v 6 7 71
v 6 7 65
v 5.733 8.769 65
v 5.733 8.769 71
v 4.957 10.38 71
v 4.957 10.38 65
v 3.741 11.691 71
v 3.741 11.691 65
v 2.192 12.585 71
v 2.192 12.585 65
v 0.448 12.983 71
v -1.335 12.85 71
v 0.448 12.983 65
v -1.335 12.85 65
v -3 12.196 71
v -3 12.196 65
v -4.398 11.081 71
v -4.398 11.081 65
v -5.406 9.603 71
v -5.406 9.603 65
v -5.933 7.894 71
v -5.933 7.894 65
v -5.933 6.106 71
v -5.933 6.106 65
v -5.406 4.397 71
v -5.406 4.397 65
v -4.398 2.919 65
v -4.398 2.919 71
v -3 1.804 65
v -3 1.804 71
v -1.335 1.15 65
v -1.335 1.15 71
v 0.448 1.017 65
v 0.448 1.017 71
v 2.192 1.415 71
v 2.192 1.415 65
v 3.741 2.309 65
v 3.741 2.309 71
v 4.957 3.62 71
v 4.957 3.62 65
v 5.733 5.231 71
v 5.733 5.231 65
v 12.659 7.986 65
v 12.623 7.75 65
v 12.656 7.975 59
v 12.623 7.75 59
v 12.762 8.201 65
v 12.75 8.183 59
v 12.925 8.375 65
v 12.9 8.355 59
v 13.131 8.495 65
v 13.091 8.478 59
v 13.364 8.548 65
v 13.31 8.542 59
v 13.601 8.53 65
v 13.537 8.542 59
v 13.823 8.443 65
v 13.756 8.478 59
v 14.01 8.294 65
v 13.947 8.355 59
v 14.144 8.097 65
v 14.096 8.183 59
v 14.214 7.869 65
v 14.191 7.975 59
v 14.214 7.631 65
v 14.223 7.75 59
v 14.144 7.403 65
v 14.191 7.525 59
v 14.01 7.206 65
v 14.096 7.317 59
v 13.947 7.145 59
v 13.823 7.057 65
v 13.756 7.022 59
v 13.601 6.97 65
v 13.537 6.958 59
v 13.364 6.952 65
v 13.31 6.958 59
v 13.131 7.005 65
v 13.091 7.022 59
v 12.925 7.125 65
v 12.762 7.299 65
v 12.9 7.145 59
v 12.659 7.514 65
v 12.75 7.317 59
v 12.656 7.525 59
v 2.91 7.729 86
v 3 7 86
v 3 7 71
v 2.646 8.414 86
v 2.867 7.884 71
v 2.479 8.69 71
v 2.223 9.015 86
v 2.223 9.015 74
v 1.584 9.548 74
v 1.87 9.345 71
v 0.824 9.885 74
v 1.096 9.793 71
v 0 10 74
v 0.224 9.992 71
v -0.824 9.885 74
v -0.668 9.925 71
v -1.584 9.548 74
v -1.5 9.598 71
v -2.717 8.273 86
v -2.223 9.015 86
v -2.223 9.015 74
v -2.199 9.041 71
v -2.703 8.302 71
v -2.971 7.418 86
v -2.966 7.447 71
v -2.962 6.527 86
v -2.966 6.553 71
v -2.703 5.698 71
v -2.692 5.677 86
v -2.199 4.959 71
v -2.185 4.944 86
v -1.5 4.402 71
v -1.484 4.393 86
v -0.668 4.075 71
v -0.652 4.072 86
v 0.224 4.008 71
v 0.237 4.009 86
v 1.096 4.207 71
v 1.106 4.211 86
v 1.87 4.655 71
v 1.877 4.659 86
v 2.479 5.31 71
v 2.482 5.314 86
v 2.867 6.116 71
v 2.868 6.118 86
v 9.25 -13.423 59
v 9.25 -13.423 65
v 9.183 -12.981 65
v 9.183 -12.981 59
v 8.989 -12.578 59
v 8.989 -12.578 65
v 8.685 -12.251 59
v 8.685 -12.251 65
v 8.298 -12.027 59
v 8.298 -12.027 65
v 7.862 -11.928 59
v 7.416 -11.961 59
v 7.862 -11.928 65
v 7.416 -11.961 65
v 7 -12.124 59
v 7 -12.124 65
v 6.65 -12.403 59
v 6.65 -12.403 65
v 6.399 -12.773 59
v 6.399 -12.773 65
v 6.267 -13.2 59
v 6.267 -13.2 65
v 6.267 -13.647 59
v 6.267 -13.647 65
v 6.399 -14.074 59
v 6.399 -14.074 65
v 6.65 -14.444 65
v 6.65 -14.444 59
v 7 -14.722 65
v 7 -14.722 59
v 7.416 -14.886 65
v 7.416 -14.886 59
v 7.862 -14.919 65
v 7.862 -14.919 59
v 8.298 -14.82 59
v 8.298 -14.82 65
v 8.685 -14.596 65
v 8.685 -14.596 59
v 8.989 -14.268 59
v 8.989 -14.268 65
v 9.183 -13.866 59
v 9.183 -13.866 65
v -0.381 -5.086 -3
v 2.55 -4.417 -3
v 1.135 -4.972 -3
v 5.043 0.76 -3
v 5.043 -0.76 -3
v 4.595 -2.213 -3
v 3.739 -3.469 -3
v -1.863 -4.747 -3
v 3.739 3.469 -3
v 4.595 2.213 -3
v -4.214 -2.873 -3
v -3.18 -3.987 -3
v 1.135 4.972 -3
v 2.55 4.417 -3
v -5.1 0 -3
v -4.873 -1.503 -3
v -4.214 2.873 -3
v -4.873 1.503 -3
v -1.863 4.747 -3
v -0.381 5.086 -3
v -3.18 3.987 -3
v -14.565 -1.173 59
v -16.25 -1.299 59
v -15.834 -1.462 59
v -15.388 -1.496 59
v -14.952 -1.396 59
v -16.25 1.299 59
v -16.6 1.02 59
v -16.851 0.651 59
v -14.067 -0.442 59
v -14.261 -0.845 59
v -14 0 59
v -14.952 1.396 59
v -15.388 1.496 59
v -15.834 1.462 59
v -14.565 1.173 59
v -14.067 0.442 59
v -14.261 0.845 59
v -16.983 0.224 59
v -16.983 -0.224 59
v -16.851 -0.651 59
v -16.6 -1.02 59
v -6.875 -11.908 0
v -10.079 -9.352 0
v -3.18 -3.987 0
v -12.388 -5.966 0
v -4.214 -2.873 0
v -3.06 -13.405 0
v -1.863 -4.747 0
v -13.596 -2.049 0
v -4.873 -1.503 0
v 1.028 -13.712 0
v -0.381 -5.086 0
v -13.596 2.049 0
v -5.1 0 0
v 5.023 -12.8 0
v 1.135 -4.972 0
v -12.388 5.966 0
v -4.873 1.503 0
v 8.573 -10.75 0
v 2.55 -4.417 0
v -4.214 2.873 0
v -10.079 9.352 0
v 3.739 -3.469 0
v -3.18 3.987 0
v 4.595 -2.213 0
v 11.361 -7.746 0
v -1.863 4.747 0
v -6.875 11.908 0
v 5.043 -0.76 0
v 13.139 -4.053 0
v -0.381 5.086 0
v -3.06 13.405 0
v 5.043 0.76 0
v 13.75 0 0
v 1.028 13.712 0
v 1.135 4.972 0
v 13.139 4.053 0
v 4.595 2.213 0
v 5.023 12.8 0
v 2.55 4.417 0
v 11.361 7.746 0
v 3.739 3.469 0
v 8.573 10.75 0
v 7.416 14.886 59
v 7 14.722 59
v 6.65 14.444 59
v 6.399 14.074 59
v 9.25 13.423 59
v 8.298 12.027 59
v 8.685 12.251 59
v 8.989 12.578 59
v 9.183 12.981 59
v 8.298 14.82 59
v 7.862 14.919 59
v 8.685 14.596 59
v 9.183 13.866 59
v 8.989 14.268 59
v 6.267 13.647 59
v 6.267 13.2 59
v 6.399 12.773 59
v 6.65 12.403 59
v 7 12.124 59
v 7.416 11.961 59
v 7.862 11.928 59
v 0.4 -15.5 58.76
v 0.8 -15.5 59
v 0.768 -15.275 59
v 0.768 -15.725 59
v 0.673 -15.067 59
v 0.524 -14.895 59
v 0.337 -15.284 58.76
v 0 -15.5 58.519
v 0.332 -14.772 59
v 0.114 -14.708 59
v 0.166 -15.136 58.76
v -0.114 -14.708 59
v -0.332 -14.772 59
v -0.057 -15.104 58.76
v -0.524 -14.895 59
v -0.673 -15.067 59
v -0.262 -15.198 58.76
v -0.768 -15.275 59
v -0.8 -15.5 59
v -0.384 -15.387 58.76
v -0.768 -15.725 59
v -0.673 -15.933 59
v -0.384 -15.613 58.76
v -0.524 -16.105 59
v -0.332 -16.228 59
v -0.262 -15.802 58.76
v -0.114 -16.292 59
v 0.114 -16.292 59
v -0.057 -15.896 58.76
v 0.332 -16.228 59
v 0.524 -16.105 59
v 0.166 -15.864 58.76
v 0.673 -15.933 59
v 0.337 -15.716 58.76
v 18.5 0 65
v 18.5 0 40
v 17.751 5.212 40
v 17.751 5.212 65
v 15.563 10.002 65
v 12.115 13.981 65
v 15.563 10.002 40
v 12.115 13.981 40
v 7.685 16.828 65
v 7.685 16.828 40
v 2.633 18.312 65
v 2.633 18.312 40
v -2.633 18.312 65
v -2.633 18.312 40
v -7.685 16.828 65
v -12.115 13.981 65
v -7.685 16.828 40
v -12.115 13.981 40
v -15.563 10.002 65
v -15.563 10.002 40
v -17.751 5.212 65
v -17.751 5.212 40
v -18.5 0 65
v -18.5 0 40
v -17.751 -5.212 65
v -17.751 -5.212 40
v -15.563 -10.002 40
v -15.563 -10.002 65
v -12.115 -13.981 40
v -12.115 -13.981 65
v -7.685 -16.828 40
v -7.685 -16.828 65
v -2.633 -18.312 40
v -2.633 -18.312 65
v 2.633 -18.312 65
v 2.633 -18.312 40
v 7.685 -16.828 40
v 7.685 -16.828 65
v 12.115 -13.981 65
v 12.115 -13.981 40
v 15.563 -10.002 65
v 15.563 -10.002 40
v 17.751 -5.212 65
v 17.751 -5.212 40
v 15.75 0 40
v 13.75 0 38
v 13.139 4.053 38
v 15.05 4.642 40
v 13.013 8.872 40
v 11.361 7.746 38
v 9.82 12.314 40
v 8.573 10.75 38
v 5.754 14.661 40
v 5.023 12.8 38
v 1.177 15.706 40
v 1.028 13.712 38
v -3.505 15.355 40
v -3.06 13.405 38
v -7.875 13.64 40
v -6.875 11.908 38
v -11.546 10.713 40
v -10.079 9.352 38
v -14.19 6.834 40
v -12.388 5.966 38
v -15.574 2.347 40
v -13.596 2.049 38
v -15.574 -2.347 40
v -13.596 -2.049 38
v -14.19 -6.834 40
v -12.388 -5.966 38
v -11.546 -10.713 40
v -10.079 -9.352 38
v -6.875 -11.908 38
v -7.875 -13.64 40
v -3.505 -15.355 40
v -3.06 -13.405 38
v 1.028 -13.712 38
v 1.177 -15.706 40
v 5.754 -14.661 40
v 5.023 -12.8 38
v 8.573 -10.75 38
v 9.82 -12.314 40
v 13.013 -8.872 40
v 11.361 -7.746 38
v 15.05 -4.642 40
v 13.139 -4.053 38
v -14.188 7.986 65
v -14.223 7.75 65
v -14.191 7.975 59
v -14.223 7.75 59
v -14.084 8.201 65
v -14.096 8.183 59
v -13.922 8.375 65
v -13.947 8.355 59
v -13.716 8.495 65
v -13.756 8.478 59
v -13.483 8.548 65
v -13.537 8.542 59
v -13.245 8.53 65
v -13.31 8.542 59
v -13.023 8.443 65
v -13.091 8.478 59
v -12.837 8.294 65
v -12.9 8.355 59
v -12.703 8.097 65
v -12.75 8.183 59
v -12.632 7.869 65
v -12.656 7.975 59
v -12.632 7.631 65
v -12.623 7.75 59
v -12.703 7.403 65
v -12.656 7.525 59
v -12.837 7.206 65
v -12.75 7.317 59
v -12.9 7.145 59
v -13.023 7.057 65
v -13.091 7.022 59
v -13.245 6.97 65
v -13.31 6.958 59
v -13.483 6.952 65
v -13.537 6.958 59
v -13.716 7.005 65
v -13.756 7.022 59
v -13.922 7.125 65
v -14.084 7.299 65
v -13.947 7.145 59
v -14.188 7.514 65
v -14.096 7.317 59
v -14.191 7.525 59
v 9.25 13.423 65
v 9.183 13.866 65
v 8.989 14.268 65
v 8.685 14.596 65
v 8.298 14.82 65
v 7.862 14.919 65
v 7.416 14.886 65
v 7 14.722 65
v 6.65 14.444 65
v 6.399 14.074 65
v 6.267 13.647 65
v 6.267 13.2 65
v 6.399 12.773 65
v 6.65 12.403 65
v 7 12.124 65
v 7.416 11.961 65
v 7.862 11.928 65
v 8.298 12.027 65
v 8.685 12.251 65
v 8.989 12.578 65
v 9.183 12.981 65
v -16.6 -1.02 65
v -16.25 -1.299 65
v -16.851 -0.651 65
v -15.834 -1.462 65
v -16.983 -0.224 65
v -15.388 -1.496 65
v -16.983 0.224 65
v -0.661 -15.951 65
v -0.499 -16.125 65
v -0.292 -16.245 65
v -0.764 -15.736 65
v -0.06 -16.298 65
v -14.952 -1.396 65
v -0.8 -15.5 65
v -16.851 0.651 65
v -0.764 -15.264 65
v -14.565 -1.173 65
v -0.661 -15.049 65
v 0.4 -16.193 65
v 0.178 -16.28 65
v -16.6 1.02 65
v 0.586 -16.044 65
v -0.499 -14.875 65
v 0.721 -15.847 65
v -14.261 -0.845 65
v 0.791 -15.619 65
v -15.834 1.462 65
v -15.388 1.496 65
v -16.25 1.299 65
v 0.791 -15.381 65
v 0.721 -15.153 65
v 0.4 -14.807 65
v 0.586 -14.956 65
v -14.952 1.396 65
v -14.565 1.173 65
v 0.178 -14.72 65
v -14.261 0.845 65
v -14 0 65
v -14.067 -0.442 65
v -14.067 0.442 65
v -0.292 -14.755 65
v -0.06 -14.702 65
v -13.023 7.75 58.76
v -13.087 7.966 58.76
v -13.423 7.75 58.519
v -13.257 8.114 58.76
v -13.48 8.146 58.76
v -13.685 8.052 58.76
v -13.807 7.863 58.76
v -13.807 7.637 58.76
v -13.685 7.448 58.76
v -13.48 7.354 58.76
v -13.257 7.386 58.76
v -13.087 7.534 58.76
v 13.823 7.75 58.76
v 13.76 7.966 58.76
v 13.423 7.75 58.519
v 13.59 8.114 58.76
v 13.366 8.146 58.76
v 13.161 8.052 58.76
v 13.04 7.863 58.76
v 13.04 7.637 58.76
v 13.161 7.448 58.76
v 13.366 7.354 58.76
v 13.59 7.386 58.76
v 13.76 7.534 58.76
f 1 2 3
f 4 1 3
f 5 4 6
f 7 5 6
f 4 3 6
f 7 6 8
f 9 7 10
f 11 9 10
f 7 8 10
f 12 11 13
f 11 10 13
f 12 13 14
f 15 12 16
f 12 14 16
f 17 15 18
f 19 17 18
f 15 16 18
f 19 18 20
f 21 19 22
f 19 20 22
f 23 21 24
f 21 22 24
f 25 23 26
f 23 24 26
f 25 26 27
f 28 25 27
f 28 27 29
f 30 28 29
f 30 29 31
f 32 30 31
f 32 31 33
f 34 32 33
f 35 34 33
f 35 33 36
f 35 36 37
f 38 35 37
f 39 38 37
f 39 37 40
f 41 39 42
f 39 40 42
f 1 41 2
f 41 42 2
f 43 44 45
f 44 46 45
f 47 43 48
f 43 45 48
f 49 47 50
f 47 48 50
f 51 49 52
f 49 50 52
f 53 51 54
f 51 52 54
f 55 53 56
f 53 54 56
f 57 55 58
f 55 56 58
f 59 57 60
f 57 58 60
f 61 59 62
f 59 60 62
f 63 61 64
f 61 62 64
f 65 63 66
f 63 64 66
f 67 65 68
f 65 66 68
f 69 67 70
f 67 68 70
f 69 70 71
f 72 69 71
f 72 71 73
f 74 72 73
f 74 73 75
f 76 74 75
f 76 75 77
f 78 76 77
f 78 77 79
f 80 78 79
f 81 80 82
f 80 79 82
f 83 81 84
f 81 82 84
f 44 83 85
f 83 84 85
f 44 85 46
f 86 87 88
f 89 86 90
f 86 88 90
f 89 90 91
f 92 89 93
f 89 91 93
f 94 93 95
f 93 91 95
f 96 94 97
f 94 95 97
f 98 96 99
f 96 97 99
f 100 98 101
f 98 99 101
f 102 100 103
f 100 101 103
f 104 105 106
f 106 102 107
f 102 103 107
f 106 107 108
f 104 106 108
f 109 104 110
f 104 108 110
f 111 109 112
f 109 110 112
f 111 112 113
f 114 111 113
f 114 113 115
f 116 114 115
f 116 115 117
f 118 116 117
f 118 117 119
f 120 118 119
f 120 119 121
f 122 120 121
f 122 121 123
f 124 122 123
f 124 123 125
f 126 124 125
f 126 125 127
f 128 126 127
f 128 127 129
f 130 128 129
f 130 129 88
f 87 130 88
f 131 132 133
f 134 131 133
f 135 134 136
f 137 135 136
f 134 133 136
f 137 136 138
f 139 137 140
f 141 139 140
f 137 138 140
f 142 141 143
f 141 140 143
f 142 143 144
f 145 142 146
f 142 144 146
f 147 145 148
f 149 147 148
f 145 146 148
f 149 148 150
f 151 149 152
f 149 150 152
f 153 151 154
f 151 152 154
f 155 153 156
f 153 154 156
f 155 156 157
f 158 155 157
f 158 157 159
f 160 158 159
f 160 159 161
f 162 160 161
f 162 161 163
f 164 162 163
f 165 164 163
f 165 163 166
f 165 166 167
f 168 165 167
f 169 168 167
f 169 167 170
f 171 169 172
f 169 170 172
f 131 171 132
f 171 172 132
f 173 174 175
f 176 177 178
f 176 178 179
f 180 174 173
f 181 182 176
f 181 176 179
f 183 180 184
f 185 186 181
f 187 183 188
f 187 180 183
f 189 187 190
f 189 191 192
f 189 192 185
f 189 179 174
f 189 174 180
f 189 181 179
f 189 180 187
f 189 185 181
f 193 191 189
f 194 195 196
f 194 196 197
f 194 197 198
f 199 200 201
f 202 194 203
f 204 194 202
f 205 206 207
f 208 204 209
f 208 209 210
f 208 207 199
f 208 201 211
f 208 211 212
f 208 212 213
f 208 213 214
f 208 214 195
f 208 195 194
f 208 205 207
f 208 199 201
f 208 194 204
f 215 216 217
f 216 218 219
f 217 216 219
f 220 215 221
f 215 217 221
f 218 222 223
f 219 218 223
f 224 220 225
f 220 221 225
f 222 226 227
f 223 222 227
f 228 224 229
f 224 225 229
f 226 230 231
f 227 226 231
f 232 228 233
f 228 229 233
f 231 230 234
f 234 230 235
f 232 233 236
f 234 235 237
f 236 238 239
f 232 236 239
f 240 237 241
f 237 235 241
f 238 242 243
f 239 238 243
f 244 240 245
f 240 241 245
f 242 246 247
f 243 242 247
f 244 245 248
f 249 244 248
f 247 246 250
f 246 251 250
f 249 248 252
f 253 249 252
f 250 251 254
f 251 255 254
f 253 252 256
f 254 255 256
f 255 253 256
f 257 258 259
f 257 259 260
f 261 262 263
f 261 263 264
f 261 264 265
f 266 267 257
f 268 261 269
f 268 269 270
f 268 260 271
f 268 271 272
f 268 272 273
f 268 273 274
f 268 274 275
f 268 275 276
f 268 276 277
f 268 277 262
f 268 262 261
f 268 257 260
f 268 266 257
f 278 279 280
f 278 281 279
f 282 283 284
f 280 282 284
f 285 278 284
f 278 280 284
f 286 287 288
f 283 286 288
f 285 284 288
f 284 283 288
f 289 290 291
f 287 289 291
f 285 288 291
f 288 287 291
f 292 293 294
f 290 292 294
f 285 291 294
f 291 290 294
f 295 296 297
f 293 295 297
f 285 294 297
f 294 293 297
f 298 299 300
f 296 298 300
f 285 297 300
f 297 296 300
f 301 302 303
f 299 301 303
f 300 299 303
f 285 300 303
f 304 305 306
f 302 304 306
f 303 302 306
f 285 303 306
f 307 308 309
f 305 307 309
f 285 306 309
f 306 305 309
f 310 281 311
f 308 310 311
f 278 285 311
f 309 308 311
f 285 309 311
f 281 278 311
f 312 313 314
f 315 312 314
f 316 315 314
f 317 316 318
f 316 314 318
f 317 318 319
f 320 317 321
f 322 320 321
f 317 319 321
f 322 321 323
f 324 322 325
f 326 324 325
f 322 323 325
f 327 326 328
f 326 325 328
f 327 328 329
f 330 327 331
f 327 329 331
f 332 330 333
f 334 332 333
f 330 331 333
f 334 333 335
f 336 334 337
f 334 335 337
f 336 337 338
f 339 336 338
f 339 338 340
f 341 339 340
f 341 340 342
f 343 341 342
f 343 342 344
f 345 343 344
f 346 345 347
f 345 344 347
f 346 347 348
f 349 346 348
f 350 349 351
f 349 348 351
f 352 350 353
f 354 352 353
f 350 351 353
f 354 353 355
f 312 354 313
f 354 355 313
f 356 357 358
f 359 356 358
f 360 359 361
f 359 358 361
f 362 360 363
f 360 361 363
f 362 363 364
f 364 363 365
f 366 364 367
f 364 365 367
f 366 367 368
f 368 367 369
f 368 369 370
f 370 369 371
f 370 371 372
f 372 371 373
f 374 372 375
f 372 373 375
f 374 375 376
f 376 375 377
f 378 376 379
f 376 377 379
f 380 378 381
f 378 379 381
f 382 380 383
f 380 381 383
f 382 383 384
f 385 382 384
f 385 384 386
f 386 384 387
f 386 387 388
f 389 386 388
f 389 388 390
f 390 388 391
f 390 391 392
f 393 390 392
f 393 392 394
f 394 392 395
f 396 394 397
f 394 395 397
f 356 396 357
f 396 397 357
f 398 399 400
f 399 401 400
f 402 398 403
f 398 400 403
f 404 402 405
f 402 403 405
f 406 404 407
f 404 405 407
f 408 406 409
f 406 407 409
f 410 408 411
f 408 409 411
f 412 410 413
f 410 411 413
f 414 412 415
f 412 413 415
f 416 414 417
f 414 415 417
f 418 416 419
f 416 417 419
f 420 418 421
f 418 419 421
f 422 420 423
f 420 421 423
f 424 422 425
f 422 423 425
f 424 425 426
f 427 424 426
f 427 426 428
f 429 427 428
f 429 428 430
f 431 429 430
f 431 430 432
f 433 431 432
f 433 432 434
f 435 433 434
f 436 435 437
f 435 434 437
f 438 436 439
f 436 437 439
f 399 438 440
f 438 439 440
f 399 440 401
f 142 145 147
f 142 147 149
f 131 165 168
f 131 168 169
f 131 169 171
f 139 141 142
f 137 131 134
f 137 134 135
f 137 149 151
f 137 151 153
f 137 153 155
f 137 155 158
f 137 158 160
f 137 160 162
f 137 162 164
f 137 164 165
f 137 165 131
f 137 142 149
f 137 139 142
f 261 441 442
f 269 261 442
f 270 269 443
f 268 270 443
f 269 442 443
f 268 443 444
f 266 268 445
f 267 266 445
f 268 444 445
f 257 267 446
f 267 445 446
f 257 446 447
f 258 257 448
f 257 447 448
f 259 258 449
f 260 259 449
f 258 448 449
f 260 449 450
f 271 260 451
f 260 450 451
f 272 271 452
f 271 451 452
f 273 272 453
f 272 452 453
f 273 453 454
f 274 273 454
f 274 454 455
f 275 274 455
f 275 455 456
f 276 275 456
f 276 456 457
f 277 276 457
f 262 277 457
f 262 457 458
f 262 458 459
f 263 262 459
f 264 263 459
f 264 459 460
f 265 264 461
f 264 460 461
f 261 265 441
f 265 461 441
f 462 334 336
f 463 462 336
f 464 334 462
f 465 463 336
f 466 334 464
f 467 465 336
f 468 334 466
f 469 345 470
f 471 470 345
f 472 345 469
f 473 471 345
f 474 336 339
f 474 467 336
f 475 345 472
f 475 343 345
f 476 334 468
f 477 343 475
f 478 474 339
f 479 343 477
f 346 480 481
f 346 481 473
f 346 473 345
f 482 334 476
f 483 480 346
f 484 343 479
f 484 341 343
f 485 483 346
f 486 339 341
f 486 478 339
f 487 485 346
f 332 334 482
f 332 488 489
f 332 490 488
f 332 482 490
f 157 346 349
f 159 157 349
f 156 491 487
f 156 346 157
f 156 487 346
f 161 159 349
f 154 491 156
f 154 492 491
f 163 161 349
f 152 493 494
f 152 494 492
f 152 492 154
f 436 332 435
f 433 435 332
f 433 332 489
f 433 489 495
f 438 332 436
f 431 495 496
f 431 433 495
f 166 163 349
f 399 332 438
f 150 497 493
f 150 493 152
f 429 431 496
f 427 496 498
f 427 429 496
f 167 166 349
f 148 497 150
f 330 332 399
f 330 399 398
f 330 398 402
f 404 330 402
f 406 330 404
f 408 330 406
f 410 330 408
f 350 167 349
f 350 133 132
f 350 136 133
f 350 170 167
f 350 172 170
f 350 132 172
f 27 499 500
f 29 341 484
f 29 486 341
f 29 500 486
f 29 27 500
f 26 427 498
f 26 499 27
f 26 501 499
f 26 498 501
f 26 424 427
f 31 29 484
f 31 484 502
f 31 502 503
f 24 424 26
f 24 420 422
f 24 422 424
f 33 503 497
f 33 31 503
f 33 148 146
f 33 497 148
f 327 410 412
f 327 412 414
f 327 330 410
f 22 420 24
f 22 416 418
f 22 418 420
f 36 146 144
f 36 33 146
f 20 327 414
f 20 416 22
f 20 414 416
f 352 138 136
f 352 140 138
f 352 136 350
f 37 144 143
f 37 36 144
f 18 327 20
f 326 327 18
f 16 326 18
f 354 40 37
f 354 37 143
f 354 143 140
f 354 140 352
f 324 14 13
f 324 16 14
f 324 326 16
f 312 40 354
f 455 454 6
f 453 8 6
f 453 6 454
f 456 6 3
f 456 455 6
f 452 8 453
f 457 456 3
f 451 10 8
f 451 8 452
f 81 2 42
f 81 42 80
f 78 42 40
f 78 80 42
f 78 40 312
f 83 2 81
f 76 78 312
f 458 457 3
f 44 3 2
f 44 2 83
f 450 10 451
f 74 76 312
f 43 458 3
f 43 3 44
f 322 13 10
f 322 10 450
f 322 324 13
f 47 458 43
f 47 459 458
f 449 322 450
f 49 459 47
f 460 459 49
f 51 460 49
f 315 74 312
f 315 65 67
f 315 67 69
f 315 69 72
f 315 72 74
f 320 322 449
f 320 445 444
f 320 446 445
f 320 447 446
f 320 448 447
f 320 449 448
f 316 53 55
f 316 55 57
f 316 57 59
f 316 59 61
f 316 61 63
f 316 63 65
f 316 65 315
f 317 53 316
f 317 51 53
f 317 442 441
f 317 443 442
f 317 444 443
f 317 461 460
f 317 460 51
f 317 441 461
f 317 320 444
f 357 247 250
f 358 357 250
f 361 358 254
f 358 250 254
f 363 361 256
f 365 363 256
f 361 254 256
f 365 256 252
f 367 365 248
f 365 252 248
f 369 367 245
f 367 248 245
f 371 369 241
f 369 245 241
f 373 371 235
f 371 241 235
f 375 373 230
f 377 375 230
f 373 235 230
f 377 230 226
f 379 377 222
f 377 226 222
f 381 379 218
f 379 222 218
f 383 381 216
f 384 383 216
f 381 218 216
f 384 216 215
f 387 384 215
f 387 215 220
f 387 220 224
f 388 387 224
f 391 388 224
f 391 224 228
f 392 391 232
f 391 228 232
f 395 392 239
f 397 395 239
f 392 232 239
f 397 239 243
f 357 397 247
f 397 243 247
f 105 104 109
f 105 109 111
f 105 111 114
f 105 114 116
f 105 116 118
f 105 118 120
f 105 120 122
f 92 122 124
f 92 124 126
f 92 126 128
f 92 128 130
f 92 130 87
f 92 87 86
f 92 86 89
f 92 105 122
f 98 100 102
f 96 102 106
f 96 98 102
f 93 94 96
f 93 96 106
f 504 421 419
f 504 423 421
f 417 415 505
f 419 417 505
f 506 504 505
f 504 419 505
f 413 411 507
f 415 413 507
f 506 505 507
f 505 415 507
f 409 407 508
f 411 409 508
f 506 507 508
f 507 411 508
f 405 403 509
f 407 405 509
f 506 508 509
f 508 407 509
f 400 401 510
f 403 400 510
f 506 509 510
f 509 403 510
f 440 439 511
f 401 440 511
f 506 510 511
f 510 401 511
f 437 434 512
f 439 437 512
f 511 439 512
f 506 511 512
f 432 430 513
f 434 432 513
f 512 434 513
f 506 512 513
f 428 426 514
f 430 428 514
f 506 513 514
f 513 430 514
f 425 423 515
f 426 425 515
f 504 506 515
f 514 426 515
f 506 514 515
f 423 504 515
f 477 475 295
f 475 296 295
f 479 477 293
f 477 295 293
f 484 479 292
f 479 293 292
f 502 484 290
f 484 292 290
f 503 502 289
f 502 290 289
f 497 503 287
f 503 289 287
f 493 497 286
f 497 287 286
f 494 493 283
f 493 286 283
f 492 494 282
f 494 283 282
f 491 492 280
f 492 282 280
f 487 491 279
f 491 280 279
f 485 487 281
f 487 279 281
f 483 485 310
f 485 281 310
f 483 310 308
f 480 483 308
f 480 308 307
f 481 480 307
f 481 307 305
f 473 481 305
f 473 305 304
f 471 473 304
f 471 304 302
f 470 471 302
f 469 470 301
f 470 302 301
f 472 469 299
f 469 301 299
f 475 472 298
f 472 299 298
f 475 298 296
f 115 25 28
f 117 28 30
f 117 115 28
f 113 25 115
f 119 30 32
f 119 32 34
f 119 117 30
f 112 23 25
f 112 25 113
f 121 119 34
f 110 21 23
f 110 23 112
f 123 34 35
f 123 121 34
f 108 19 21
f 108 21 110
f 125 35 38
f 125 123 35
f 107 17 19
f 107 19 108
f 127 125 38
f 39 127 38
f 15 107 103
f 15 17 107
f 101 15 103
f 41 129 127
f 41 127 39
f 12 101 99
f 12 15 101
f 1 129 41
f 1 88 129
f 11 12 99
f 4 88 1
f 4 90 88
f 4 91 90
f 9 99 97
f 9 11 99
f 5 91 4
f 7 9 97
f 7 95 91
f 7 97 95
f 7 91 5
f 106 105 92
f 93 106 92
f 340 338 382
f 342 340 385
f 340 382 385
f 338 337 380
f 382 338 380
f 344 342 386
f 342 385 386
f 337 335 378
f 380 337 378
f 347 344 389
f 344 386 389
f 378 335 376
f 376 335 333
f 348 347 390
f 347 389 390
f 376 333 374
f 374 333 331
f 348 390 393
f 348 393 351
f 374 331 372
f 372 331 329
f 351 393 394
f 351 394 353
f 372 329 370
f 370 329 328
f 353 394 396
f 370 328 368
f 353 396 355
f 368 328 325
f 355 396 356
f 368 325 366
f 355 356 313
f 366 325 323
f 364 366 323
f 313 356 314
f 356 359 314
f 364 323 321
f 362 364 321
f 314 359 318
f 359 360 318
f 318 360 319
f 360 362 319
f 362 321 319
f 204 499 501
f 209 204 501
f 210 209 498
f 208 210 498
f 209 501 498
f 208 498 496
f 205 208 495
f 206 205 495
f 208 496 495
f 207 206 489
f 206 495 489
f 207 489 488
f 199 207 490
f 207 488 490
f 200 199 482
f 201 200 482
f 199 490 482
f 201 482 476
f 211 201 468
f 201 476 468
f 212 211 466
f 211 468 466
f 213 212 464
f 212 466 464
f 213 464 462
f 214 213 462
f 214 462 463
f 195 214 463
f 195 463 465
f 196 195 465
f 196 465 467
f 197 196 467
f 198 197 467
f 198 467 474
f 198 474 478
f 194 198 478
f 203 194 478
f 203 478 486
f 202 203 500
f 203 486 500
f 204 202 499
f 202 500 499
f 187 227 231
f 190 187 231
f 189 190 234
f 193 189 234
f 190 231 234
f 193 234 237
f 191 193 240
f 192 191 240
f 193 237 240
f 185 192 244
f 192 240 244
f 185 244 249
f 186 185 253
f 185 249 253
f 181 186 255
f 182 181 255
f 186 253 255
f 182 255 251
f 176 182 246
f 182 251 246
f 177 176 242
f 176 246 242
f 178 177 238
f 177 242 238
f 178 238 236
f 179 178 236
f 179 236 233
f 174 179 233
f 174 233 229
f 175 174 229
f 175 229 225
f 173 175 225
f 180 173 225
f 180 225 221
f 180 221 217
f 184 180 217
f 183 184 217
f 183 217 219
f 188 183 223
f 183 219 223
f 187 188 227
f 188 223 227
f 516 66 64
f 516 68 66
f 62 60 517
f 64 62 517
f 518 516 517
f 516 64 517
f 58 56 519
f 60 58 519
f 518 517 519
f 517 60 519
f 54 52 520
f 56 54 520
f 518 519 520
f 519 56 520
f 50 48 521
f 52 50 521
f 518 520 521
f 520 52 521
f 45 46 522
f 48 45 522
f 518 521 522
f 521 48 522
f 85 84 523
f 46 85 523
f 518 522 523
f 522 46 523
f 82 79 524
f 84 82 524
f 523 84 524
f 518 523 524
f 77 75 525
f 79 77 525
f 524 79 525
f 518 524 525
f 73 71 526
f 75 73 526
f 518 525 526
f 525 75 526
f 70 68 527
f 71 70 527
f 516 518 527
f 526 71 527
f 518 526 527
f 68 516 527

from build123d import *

# Parameters (mm, degrees)
SKETCH_2_R          = 13.75
EXTRUDE_1_DEPTH     = 40
SKETCH_3_R          = 18.5
EXTRUDE_2_DEPTH     = 25
CHAMFER_1_SIZE      = 2
SKETCH_4_R          = 6
EXTRUDE_3_DEPTH     = 6
SKETCH_5_R          = 3
EXTRUDE_4_DEPTH     = 15
CUT_EXTRUDE_1_DEPTH = 12
SKETCH_7_R          = 1.5
CUT_EXTRUDE_2_DEPTH = 6
SKETCH_8_R          = 1.5
CUT_EXTRUDE_3_DEPTH = 6
SKETCH_10_R         = 1.5
CUT_EXTRUDE_4_DEPTH = 6
SKETCH_11_R         = 5.1
EXTRUDE_5_DEPTH     = 3
M2X0_4_1_D          = 1.6
M2X0_4_1_DEPTH      = 6
M2X0_4_1_TIP        = 0.480688495


with BuildPart() as part:
    # ｽｹｯﾁ2 → ﾎﾞｽ - 押し出し1 (new body)
    with BuildSketch(Plane.XY):
        Circle(SKETCH_2_R)
    extrude(amount=EXTRUDE_1_DEPTH)

    # ｽｹｯﾁ3 → ﾎﾞｽ - 押し出し2 (add)
    with BuildSketch(Plane.XY.offset(40)):
        Circle(SKETCH_3_R)
    extrude(amount=EXTRUDE_2_DEPTH)

    # 面取り1
    chamfer_1_edges = [part.edges().sort_by_distance(p)[0] for p in [
        (-13.75, 0, 40),
    ]]
    chamfer(chamfer_1_edges, length=CHAMFER_1_SIZE)

    # ｽｹｯﾁ4 → ﾎﾞｽ - 押し出し3 (add)
    with BuildSketch(Plane.XY.offset(65)):
        with Locations((0, 7)):
            Circle(SKETCH_4_R)
    extrude(amount=EXTRUDE_3_DEPTH)

    # ｽｹｯﾁ5 → ﾎﾞｽ - 押し出し4 (add)
    with BuildSketch(Plane.XY.offset(71)):
        with Locations((0, 7)):
            Circle(SKETCH_5_R)
    extrude(amount=EXTRUDE_4_DEPTH)

    # ｽｹｯﾁ6 → ｶｯﾄ - 押し出し1 (cut)
    with BuildSketch(Plane.XY.offset(86)):
        with BuildLine():
            Line((-2.222509648, 9.015056045), (2.222509648, 9.015056045))
            ThreePointArc((2.222509648, 9.015056045), (0, 10), (-2.222509648, 9.015056045))
        make_face()
    extrude(amount=-CUT_EXTRUDE_1_DEPTH, mode=Mode.SUBTRACT)

    # ｽｹｯﾁ7 → ｶｯﾄ - 押し出し2 (cut)
    with BuildSketch(Plane.XY.offset(65)):
        with Locations((-15.5, 0)):
            Circle(SKETCH_7_R)
    extrude(amount=-CUT_EXTRUDE_2_DEPTH, mode=Mode.SUBTRACT)

    # ｽｹｯﾁ8 → ｶｯﾄ - 押し出し3 (cut)
    with BuildSketch(Plane.XY.offset(65)):
        with Locations((7.75, -13.423393759)):
            Circle(SKETCH_8_R)
    extrude(amount=-CUT_EXTRUDE_3_DEPTH, mode=Mode.SUBTRACT)

    # ｽｹｯﾁ10 → ｶｯﾄ - 押し出し4 (cut)
    with BuildSketch(Plane.XY.offset(65)):
        with Locations((7.75, 13.423393759)):
            Circle(SKETCH_10_R)
    extrude(amount=-CUT_EXTRUDE_4_DEPTH, mode=Mode.SUBTRACT)

    # ｽｹｯﾁ11 → ﾎﾞｽ - 押し出し5 (add)
    with BuildSketch(Plane(origin=(0, 0, 0), x_dir=(-1, 0, 0), z_dir=(0, 0, -1))):
        Circle(SKETCH_11_R)
    extrude(amount=EXTRUDE_5_DEPTH)

    # M2x0.4 ねじ穴1
    with Locations(Plane.XY.offset(65)):
        with Locations((-13.423393759, 7.75), (0, -15.5), (13.423393759, 7.75)):
            Hole(M2X0_4_1_D / 2, depth=M2X0_4_1_DEPTH)
            with Locations((0, 0, -(M2X0_4_1_DEPTH + M2X0_4_1_TIP / 2))):  # 118° drill point
                Cone(0, M2X0_4_1_D / 2, M2X0_4_1_TIP, mode=Mode.SUBTRACT)


solid = part.part
